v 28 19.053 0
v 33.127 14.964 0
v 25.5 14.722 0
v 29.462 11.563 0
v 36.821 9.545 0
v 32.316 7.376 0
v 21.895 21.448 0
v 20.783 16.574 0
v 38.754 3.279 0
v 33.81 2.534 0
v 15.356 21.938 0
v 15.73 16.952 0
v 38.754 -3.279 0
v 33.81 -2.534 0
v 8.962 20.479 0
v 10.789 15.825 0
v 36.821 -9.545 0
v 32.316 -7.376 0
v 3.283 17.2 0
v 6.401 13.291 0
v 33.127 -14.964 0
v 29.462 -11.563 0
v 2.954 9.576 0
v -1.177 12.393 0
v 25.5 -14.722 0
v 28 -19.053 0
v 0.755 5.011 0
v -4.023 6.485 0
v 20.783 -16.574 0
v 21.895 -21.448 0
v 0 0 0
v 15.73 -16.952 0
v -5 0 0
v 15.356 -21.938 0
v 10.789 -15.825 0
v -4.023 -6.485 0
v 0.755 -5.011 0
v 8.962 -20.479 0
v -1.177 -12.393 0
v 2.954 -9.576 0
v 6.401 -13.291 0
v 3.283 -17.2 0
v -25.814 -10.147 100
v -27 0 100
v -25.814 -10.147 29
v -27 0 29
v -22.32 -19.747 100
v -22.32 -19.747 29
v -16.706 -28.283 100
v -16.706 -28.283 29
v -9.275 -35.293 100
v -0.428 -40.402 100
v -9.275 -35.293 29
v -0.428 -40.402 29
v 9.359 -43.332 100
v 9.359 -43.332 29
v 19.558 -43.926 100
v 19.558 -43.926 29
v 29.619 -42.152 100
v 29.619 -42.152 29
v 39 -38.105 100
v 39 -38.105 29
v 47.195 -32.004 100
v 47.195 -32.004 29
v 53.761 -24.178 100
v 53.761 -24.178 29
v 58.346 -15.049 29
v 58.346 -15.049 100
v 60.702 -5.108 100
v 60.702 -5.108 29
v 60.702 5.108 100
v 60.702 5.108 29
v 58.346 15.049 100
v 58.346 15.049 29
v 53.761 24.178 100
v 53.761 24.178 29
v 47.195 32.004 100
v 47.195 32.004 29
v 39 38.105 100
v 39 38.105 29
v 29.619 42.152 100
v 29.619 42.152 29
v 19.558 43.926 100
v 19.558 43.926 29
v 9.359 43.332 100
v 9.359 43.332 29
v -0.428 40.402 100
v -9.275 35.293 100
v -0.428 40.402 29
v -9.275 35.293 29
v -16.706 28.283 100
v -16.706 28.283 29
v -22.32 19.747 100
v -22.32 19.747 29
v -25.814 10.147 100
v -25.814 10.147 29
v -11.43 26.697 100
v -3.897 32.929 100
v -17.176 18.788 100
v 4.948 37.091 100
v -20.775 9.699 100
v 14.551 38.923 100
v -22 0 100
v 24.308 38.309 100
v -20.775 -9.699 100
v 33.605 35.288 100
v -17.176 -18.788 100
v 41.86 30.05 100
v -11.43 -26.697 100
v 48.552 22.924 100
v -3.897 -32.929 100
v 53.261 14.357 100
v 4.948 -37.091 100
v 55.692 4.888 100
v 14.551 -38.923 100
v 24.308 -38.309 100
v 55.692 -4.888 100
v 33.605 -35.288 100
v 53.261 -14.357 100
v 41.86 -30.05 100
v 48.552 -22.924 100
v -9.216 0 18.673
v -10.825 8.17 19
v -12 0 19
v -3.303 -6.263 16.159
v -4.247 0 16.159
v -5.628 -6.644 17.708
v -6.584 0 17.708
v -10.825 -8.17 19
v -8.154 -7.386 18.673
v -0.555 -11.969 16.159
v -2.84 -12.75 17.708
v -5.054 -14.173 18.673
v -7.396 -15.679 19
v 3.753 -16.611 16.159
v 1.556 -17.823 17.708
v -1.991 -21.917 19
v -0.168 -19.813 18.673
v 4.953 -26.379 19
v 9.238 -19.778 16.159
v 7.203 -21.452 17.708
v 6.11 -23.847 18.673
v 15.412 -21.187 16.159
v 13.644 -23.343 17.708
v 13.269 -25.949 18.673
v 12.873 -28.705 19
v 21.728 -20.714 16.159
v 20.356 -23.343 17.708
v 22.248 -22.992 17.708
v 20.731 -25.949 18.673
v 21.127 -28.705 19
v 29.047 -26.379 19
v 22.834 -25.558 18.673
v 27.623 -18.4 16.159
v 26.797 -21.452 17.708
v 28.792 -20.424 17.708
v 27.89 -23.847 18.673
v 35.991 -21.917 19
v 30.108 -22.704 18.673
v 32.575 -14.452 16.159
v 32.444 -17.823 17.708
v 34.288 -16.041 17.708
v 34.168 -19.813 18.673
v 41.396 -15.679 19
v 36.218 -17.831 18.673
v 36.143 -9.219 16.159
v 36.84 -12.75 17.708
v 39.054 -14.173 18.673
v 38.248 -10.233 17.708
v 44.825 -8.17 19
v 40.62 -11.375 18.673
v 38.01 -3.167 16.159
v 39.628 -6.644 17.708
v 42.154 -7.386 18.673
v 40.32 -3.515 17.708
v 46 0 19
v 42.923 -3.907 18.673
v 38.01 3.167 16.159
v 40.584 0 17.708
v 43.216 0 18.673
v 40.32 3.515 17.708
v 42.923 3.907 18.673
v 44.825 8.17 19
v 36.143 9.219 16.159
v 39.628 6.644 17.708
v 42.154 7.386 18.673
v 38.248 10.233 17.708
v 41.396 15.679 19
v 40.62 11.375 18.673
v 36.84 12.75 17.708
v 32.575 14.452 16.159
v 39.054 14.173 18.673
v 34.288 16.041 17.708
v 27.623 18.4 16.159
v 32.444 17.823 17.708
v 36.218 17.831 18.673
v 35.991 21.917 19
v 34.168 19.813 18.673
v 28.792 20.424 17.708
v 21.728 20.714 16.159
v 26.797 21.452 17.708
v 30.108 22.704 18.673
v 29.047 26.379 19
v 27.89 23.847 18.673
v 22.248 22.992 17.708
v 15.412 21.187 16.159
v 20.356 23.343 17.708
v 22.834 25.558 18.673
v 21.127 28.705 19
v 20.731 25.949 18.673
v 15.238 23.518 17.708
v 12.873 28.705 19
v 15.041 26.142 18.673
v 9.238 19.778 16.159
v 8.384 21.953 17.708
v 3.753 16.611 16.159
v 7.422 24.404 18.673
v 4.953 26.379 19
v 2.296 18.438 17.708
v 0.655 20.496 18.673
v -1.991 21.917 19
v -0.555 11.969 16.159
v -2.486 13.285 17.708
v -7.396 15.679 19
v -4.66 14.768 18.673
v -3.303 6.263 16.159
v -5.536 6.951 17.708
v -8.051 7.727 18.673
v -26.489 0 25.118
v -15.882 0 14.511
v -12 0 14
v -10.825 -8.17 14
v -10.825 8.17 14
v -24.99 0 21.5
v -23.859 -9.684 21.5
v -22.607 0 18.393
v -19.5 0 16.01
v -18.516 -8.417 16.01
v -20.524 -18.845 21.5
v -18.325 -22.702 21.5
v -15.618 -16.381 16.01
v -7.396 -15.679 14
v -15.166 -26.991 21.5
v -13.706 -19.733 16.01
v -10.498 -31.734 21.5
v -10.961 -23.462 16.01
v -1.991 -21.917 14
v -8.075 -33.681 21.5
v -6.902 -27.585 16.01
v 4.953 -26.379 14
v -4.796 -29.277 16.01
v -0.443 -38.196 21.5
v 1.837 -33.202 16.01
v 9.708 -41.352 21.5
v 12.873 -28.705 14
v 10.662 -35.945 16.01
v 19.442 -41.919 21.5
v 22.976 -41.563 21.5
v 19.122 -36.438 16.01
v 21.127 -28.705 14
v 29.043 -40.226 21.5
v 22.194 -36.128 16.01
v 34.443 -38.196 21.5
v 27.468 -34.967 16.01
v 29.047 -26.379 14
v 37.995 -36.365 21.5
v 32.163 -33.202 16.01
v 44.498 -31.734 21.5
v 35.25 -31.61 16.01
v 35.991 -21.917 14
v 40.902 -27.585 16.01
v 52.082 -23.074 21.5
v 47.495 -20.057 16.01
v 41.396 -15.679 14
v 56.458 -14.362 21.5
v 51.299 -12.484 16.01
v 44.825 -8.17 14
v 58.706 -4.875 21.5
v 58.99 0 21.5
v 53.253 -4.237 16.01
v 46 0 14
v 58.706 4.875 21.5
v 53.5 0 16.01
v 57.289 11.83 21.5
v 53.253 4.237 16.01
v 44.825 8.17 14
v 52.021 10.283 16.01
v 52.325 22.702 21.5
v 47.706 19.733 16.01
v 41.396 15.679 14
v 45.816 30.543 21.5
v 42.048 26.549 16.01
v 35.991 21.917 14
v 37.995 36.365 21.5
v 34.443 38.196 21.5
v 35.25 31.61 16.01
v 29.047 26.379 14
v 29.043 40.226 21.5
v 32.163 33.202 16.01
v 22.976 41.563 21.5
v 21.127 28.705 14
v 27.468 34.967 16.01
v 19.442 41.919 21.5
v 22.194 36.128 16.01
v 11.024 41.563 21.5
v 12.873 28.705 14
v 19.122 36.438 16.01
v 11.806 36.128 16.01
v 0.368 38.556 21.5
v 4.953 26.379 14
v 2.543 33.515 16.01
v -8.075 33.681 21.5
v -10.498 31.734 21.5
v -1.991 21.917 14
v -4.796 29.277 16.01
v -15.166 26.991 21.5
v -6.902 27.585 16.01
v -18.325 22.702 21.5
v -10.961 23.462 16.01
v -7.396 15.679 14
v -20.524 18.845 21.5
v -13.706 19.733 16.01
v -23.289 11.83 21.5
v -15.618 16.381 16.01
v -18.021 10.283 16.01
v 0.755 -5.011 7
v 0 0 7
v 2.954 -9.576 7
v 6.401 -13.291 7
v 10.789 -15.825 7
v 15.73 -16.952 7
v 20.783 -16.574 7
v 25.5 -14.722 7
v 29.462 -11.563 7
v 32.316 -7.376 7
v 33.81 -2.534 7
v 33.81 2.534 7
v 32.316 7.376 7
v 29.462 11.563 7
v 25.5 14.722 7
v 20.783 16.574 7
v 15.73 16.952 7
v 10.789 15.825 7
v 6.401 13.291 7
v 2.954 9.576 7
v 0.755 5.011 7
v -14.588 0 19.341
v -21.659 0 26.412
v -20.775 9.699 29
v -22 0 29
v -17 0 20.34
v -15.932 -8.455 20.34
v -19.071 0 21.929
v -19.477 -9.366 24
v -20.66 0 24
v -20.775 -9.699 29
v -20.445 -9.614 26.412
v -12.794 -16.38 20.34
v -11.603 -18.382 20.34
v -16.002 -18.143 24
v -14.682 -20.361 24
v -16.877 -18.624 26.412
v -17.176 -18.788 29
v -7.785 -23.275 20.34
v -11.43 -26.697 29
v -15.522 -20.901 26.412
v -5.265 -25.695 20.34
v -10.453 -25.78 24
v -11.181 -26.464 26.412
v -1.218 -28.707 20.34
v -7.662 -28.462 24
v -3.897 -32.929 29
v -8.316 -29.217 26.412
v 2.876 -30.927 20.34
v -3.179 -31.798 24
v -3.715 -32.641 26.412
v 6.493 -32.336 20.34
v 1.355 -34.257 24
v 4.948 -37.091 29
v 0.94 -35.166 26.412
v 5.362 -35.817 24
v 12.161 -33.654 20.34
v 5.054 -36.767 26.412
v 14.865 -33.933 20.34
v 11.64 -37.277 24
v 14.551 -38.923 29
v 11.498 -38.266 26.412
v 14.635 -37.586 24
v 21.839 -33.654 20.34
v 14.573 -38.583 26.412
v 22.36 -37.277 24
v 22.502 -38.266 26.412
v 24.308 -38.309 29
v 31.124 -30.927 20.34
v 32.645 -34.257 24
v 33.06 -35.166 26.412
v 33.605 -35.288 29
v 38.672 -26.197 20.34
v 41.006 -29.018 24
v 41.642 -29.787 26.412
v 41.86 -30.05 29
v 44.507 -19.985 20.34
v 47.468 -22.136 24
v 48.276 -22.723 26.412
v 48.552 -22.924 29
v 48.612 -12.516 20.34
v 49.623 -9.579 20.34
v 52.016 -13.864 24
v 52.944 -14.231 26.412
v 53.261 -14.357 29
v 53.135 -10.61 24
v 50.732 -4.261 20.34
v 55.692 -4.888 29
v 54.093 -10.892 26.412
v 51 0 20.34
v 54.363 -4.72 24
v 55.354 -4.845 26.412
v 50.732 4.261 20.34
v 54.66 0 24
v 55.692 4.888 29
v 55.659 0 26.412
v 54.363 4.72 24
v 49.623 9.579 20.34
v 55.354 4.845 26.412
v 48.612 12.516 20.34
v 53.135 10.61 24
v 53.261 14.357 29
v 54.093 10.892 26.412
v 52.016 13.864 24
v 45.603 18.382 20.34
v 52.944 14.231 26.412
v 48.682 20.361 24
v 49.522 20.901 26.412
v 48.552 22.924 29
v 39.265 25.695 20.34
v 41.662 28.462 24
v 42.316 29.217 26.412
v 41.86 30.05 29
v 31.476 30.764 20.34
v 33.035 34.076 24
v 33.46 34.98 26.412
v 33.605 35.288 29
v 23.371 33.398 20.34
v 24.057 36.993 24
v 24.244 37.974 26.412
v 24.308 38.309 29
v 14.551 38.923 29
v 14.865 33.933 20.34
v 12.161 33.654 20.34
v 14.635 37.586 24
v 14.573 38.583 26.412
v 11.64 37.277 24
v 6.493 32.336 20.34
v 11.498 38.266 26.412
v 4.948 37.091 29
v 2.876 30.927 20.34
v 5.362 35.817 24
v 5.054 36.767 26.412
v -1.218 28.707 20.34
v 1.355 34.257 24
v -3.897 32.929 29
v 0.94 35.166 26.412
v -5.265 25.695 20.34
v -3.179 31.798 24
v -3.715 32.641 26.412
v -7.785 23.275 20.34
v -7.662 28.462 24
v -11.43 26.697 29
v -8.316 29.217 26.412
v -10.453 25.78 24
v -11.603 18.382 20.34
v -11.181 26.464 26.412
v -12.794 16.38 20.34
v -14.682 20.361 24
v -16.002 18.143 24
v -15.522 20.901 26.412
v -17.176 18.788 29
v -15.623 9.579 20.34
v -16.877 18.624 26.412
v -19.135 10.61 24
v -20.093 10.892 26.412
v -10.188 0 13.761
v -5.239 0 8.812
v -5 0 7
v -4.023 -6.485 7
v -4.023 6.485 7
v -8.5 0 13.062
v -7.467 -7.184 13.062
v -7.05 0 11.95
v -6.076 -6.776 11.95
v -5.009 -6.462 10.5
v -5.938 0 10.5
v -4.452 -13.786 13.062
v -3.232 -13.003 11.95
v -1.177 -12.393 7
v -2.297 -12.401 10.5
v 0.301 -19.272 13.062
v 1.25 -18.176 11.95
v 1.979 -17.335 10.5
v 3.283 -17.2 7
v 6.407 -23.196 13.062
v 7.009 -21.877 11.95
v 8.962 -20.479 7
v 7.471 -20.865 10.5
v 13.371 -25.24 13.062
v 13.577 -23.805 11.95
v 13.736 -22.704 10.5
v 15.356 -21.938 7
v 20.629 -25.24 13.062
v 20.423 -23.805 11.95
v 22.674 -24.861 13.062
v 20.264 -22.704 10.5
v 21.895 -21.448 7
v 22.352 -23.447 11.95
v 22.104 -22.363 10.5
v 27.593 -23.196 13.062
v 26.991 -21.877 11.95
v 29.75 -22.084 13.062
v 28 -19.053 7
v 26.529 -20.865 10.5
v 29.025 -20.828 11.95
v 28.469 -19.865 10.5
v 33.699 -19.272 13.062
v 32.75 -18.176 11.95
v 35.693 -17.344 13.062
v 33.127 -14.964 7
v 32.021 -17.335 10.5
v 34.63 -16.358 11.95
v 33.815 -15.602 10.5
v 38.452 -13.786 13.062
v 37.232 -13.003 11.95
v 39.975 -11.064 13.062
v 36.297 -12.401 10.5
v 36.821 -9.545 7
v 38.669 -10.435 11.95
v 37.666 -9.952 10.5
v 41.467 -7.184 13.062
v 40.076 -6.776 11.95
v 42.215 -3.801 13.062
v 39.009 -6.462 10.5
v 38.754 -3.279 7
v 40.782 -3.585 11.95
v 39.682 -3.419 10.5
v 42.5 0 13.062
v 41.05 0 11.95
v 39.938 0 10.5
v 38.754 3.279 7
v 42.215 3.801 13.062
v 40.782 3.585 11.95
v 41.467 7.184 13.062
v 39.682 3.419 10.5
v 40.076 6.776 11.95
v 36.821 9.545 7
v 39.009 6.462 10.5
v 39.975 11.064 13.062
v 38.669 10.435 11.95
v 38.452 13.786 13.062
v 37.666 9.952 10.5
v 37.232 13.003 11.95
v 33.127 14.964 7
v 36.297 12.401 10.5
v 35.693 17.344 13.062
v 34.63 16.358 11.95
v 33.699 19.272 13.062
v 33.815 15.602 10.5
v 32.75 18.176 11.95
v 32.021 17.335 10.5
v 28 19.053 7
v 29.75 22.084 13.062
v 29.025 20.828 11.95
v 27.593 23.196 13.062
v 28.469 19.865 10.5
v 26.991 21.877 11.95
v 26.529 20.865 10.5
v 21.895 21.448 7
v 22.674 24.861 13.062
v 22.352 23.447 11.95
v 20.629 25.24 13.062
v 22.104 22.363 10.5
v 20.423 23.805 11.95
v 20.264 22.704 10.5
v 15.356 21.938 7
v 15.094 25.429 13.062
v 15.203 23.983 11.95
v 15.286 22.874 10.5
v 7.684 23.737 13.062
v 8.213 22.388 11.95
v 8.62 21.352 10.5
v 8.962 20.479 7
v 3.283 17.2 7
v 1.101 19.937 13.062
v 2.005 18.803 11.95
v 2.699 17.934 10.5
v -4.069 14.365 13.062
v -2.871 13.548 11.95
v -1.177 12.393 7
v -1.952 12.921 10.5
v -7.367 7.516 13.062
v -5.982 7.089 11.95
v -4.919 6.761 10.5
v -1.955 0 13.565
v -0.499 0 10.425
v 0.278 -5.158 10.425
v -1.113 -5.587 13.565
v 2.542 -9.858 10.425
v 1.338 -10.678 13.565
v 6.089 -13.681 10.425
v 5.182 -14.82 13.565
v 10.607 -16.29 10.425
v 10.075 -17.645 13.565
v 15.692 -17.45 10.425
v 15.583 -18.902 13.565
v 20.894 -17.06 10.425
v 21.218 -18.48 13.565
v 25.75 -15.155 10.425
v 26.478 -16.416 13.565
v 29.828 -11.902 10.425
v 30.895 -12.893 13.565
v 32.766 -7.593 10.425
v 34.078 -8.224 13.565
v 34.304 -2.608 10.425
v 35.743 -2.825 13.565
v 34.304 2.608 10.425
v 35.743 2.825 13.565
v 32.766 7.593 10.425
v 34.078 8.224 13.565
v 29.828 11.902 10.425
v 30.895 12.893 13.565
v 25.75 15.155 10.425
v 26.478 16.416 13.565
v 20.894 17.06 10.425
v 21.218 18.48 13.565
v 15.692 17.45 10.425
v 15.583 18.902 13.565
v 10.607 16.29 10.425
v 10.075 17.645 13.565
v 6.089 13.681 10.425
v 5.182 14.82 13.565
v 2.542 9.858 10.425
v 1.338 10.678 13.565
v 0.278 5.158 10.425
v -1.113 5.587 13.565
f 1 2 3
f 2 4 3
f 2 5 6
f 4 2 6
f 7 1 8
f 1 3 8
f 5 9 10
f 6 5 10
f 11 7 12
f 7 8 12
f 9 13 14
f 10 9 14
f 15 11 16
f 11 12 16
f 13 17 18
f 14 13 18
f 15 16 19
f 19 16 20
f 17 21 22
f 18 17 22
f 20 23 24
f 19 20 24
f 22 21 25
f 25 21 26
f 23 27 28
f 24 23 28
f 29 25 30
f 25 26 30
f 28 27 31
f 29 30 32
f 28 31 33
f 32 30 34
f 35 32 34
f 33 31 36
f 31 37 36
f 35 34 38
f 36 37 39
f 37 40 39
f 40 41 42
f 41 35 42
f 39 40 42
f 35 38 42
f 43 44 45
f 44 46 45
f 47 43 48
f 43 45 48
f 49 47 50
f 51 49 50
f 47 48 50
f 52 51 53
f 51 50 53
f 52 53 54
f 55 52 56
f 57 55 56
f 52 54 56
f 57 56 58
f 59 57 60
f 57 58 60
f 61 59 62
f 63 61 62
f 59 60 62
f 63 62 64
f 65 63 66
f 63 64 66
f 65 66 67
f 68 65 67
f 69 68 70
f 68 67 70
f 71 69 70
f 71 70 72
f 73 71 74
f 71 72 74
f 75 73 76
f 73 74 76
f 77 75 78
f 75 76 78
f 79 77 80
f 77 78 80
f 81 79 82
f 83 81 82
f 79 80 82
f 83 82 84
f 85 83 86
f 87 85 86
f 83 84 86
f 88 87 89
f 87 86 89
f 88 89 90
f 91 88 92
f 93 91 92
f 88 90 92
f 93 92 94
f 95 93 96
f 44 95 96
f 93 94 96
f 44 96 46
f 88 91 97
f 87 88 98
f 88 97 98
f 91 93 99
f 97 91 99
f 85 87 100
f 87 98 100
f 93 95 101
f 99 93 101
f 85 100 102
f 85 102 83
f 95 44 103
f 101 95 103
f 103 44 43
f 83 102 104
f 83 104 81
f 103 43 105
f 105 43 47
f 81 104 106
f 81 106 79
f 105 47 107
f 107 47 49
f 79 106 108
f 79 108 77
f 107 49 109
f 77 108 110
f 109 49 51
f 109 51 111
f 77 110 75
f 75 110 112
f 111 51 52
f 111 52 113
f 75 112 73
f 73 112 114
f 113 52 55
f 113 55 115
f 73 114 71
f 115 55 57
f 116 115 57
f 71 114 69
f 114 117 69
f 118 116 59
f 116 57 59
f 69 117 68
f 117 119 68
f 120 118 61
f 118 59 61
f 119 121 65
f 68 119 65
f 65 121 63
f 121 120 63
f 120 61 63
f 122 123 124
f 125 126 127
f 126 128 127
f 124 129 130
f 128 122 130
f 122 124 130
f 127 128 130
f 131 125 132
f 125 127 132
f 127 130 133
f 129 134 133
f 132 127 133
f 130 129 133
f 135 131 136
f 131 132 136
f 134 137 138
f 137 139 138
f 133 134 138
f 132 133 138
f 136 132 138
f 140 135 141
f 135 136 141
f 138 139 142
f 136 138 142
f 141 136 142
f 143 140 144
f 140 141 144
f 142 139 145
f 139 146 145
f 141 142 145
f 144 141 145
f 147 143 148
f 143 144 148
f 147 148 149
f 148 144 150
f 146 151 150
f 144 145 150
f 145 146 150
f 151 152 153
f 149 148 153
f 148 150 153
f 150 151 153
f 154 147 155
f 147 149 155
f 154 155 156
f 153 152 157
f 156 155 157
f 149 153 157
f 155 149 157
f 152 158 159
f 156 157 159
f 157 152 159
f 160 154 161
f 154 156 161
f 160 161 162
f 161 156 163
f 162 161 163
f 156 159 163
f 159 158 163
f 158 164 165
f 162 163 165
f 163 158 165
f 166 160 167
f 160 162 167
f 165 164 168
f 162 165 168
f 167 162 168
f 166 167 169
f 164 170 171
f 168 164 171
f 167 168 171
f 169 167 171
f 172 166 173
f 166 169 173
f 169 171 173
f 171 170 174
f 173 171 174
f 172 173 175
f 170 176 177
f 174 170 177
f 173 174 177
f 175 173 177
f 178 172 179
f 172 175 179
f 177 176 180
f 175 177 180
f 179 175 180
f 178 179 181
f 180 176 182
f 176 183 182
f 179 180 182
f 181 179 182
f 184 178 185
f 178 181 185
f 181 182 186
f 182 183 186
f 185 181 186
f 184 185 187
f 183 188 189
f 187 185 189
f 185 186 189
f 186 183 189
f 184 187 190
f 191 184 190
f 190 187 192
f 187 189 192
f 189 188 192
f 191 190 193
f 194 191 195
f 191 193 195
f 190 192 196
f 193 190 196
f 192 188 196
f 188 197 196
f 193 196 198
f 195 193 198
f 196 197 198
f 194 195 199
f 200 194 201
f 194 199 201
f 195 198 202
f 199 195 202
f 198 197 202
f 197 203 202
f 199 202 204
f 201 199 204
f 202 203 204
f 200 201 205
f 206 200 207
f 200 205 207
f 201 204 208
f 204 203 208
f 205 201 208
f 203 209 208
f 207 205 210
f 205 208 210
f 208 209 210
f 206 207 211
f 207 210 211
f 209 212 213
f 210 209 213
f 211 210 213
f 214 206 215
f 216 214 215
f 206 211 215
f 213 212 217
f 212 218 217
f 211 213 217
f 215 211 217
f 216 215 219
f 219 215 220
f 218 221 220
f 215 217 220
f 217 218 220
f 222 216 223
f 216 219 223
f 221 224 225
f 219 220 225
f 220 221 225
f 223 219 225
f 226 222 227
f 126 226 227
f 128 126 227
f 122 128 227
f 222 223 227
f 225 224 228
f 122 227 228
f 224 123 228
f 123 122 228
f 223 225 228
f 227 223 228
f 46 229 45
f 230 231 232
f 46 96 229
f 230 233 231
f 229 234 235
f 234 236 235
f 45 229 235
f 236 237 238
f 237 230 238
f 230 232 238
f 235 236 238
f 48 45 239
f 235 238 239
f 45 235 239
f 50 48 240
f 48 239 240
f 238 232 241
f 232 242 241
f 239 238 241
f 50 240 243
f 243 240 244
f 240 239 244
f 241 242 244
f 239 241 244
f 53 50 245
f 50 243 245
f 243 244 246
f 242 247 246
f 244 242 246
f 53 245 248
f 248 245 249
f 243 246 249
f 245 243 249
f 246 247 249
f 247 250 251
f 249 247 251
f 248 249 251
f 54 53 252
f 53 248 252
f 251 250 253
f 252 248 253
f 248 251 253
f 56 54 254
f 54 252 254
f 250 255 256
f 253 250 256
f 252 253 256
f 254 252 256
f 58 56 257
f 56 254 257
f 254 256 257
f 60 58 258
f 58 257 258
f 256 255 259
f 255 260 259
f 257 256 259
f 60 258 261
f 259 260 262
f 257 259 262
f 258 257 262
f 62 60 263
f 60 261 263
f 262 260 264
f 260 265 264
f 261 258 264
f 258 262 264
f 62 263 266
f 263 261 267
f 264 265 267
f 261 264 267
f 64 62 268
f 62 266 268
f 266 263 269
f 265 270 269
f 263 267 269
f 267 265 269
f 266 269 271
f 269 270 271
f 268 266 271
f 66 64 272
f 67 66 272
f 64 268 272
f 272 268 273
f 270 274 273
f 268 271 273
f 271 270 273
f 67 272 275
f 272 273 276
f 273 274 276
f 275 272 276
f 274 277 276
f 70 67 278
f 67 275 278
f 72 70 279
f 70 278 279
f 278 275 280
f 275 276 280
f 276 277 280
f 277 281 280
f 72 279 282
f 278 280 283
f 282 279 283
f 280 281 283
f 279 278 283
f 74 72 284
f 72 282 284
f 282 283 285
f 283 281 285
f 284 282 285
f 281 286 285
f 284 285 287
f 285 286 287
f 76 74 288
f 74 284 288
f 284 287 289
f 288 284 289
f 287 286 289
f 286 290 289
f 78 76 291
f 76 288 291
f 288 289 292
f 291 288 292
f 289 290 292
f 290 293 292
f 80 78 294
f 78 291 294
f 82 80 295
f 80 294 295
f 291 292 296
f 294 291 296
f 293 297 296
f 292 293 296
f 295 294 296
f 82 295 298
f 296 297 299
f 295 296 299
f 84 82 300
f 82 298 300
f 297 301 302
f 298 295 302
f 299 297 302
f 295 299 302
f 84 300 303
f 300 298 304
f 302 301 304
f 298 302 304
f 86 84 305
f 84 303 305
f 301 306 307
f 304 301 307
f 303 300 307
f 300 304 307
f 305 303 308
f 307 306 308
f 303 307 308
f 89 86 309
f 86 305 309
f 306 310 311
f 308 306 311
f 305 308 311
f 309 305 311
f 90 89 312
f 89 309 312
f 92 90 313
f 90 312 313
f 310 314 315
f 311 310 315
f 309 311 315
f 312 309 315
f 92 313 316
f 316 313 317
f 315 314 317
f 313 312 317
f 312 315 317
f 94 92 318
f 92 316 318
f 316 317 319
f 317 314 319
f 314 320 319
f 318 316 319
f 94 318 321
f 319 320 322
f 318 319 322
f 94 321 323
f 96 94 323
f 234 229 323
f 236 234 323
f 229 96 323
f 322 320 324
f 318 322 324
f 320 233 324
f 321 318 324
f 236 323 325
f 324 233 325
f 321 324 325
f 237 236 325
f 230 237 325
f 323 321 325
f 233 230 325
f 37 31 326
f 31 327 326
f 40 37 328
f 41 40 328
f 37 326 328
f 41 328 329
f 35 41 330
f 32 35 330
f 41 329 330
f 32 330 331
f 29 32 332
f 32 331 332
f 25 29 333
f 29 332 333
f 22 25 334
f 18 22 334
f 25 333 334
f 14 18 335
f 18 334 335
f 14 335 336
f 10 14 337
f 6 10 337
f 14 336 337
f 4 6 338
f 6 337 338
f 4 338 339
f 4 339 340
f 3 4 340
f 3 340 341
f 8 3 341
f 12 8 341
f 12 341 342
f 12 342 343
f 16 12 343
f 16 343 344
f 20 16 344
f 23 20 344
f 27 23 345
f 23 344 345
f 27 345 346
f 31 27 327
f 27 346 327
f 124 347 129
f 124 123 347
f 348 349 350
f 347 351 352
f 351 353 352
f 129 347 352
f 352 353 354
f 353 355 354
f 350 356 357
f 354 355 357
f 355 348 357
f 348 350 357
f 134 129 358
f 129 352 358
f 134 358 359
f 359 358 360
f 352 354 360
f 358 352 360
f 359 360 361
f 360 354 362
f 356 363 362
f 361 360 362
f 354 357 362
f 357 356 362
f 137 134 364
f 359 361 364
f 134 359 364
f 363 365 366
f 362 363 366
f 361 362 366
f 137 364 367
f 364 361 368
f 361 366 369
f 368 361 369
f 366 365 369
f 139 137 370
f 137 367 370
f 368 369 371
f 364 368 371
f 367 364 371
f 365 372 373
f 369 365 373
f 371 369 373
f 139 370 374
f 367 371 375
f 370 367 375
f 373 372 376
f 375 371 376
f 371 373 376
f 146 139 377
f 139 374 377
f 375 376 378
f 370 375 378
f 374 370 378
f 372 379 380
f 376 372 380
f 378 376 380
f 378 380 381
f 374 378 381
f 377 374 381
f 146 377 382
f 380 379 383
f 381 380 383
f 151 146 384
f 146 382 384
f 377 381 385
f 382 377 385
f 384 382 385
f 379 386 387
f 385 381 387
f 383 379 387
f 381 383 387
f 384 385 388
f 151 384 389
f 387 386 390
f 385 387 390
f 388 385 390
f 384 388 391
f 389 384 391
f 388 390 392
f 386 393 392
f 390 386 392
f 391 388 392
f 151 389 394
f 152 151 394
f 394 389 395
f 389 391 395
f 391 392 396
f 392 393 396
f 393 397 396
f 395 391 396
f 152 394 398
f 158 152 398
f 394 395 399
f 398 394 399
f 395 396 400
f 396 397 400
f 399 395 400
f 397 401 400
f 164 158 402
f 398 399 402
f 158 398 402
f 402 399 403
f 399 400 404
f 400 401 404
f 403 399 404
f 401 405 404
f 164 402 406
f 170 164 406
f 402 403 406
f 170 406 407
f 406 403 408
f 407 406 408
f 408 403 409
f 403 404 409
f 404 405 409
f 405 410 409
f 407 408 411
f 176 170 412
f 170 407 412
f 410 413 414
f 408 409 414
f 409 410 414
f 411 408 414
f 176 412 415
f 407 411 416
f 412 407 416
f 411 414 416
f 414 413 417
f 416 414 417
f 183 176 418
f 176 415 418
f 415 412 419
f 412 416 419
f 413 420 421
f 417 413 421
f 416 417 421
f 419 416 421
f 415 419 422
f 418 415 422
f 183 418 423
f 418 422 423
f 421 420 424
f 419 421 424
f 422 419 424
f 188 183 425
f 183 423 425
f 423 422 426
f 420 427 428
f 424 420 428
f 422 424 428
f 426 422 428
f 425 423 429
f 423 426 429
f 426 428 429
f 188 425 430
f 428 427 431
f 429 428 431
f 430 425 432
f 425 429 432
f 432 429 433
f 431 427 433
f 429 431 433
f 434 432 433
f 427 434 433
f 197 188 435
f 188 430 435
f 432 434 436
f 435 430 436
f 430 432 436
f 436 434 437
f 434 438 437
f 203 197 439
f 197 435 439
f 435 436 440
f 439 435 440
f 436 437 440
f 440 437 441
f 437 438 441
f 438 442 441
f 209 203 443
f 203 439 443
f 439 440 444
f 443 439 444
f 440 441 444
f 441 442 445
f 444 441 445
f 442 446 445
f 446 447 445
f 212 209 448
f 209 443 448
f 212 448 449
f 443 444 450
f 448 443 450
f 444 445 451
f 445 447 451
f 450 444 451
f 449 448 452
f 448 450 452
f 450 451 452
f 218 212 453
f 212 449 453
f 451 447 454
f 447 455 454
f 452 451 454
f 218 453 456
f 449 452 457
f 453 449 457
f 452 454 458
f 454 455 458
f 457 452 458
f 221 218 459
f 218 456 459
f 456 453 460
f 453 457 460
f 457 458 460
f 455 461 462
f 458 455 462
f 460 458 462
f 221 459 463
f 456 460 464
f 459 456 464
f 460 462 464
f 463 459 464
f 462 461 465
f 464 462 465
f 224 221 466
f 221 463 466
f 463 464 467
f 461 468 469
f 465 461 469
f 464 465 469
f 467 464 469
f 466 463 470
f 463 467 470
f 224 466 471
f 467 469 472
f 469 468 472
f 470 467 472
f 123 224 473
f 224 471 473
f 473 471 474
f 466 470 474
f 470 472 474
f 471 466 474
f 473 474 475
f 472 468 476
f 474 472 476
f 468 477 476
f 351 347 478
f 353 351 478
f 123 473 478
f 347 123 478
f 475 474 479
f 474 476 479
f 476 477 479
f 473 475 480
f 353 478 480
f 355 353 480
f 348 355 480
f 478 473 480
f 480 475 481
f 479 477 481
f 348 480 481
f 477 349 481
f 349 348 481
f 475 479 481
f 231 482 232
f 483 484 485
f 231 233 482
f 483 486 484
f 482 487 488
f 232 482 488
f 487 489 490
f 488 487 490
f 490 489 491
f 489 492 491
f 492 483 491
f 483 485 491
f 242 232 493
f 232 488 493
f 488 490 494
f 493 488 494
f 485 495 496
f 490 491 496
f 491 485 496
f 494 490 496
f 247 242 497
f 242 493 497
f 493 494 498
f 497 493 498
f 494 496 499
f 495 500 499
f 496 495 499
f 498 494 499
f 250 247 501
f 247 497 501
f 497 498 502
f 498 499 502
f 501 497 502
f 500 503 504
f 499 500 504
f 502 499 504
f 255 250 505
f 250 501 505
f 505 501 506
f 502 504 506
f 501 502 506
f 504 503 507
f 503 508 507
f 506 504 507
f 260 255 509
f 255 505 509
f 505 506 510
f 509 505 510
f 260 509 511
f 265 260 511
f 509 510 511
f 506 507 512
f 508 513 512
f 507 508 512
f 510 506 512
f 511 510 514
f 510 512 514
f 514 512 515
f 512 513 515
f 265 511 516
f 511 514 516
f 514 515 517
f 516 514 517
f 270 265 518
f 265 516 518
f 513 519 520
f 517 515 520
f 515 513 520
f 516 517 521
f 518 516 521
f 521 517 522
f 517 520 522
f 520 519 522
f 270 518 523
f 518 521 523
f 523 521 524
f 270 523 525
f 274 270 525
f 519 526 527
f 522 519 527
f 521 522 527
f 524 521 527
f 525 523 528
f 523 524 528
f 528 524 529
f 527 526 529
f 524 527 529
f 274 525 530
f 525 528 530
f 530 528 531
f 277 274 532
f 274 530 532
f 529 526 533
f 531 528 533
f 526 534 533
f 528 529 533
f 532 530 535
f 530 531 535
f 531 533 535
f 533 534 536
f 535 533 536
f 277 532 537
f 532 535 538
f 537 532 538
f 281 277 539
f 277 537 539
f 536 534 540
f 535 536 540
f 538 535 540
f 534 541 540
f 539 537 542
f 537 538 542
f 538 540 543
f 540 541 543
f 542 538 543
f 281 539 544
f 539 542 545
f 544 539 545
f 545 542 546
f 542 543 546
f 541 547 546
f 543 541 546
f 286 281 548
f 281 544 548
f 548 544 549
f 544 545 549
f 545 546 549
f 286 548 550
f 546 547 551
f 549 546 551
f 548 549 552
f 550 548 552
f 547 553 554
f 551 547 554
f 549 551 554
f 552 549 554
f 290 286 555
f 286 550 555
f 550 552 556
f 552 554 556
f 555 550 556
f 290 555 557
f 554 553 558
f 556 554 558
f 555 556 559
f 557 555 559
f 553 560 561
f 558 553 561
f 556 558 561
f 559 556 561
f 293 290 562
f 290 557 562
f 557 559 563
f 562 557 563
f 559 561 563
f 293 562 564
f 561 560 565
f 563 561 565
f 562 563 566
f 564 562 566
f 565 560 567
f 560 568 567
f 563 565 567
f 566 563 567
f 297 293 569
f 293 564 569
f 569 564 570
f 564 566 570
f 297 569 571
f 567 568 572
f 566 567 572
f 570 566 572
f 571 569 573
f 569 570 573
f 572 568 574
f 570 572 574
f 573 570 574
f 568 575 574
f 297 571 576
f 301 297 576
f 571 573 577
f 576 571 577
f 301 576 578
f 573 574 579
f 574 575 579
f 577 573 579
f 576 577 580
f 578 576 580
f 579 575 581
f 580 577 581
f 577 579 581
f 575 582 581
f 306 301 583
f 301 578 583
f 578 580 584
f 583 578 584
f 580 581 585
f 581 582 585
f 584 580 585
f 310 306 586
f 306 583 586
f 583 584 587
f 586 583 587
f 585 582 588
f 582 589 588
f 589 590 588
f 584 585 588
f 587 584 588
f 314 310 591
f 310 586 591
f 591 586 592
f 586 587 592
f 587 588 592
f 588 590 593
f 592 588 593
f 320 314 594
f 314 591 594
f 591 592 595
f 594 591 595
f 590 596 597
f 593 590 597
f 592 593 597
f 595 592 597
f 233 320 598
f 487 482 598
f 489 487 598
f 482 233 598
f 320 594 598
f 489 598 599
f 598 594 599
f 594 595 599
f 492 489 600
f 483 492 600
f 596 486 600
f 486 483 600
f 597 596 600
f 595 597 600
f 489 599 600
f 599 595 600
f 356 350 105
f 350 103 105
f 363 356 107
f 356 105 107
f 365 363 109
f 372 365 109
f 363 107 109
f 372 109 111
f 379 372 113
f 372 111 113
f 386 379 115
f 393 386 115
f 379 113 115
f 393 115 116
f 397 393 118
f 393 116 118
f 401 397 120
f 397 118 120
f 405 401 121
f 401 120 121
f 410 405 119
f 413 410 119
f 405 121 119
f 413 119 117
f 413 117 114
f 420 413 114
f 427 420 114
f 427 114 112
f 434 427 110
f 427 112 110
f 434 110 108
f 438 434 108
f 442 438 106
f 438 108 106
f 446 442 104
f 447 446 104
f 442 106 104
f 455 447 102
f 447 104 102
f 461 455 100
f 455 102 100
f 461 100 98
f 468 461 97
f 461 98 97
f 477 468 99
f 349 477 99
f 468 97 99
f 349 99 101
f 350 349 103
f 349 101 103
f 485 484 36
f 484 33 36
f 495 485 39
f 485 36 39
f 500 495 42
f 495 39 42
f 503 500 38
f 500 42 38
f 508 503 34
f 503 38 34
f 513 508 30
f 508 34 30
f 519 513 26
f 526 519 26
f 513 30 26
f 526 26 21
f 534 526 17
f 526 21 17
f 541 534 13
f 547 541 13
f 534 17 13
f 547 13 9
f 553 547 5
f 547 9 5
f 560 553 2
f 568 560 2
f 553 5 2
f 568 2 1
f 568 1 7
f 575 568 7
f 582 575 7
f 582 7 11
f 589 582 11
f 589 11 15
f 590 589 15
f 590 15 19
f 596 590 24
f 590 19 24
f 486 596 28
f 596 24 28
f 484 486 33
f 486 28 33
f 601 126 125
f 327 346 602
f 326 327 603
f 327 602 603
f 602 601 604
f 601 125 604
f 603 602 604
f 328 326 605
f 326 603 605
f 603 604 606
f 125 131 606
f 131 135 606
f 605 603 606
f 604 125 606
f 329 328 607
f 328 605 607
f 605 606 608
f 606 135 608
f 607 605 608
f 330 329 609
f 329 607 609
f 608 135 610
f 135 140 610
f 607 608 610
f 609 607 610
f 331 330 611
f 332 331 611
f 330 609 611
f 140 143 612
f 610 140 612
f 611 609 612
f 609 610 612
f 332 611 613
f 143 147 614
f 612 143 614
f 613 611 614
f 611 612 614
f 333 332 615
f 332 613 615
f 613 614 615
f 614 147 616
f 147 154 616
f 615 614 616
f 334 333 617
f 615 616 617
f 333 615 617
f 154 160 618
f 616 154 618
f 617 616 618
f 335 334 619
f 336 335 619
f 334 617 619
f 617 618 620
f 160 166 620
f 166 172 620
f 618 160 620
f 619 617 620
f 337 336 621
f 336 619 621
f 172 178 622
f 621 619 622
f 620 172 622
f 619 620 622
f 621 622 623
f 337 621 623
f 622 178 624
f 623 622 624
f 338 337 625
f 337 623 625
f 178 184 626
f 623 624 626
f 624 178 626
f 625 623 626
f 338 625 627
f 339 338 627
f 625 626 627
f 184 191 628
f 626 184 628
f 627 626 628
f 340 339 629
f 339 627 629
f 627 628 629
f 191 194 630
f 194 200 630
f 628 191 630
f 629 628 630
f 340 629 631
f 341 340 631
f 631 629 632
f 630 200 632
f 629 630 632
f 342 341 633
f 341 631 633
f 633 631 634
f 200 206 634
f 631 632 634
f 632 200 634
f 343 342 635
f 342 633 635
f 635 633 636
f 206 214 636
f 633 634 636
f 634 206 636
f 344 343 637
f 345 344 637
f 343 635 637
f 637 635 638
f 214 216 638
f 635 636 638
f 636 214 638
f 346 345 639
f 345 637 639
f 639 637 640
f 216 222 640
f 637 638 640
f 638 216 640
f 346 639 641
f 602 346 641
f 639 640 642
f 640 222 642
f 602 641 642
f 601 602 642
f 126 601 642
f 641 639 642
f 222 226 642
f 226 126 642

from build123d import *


with BuildPart() as f1:
    # F0 (on Front) → F1 (revolve)
    with BuildSketch(Plane.XZ):
        with BuildLine():
            Line((-5, 0), (0, 0))
            Line((0, 0), (0, 7))
            ThreePointArc((0, 7), (-1.113366, 12.047892), (-4.246868, 16.159091))
            ThreePointArc((-4.246868, 16.159091), (-7.871386, 18.267411), (-12, 19))
            ThreePointArc((-12, 19), (-19.071068, 21.928932), (-22, 29))
            Line((-22, 29), (-22, 100))
            Line((-22, 100), (-27, 100))
            Line((-27, 100), (-27, 29))
            ThreePointArc((-27, 29), (-22.606602, 18.393398), (-12, 14))
            ThreePointArc((-12, 14), (-7.050253, 11.949747), (-5, 7))
            Line((-5, 7), (-5, 0))
        make_face()
    revolve(axis=Axis((17, 0, 30.384544), (0, 0, 1)))


solid = f1.part
